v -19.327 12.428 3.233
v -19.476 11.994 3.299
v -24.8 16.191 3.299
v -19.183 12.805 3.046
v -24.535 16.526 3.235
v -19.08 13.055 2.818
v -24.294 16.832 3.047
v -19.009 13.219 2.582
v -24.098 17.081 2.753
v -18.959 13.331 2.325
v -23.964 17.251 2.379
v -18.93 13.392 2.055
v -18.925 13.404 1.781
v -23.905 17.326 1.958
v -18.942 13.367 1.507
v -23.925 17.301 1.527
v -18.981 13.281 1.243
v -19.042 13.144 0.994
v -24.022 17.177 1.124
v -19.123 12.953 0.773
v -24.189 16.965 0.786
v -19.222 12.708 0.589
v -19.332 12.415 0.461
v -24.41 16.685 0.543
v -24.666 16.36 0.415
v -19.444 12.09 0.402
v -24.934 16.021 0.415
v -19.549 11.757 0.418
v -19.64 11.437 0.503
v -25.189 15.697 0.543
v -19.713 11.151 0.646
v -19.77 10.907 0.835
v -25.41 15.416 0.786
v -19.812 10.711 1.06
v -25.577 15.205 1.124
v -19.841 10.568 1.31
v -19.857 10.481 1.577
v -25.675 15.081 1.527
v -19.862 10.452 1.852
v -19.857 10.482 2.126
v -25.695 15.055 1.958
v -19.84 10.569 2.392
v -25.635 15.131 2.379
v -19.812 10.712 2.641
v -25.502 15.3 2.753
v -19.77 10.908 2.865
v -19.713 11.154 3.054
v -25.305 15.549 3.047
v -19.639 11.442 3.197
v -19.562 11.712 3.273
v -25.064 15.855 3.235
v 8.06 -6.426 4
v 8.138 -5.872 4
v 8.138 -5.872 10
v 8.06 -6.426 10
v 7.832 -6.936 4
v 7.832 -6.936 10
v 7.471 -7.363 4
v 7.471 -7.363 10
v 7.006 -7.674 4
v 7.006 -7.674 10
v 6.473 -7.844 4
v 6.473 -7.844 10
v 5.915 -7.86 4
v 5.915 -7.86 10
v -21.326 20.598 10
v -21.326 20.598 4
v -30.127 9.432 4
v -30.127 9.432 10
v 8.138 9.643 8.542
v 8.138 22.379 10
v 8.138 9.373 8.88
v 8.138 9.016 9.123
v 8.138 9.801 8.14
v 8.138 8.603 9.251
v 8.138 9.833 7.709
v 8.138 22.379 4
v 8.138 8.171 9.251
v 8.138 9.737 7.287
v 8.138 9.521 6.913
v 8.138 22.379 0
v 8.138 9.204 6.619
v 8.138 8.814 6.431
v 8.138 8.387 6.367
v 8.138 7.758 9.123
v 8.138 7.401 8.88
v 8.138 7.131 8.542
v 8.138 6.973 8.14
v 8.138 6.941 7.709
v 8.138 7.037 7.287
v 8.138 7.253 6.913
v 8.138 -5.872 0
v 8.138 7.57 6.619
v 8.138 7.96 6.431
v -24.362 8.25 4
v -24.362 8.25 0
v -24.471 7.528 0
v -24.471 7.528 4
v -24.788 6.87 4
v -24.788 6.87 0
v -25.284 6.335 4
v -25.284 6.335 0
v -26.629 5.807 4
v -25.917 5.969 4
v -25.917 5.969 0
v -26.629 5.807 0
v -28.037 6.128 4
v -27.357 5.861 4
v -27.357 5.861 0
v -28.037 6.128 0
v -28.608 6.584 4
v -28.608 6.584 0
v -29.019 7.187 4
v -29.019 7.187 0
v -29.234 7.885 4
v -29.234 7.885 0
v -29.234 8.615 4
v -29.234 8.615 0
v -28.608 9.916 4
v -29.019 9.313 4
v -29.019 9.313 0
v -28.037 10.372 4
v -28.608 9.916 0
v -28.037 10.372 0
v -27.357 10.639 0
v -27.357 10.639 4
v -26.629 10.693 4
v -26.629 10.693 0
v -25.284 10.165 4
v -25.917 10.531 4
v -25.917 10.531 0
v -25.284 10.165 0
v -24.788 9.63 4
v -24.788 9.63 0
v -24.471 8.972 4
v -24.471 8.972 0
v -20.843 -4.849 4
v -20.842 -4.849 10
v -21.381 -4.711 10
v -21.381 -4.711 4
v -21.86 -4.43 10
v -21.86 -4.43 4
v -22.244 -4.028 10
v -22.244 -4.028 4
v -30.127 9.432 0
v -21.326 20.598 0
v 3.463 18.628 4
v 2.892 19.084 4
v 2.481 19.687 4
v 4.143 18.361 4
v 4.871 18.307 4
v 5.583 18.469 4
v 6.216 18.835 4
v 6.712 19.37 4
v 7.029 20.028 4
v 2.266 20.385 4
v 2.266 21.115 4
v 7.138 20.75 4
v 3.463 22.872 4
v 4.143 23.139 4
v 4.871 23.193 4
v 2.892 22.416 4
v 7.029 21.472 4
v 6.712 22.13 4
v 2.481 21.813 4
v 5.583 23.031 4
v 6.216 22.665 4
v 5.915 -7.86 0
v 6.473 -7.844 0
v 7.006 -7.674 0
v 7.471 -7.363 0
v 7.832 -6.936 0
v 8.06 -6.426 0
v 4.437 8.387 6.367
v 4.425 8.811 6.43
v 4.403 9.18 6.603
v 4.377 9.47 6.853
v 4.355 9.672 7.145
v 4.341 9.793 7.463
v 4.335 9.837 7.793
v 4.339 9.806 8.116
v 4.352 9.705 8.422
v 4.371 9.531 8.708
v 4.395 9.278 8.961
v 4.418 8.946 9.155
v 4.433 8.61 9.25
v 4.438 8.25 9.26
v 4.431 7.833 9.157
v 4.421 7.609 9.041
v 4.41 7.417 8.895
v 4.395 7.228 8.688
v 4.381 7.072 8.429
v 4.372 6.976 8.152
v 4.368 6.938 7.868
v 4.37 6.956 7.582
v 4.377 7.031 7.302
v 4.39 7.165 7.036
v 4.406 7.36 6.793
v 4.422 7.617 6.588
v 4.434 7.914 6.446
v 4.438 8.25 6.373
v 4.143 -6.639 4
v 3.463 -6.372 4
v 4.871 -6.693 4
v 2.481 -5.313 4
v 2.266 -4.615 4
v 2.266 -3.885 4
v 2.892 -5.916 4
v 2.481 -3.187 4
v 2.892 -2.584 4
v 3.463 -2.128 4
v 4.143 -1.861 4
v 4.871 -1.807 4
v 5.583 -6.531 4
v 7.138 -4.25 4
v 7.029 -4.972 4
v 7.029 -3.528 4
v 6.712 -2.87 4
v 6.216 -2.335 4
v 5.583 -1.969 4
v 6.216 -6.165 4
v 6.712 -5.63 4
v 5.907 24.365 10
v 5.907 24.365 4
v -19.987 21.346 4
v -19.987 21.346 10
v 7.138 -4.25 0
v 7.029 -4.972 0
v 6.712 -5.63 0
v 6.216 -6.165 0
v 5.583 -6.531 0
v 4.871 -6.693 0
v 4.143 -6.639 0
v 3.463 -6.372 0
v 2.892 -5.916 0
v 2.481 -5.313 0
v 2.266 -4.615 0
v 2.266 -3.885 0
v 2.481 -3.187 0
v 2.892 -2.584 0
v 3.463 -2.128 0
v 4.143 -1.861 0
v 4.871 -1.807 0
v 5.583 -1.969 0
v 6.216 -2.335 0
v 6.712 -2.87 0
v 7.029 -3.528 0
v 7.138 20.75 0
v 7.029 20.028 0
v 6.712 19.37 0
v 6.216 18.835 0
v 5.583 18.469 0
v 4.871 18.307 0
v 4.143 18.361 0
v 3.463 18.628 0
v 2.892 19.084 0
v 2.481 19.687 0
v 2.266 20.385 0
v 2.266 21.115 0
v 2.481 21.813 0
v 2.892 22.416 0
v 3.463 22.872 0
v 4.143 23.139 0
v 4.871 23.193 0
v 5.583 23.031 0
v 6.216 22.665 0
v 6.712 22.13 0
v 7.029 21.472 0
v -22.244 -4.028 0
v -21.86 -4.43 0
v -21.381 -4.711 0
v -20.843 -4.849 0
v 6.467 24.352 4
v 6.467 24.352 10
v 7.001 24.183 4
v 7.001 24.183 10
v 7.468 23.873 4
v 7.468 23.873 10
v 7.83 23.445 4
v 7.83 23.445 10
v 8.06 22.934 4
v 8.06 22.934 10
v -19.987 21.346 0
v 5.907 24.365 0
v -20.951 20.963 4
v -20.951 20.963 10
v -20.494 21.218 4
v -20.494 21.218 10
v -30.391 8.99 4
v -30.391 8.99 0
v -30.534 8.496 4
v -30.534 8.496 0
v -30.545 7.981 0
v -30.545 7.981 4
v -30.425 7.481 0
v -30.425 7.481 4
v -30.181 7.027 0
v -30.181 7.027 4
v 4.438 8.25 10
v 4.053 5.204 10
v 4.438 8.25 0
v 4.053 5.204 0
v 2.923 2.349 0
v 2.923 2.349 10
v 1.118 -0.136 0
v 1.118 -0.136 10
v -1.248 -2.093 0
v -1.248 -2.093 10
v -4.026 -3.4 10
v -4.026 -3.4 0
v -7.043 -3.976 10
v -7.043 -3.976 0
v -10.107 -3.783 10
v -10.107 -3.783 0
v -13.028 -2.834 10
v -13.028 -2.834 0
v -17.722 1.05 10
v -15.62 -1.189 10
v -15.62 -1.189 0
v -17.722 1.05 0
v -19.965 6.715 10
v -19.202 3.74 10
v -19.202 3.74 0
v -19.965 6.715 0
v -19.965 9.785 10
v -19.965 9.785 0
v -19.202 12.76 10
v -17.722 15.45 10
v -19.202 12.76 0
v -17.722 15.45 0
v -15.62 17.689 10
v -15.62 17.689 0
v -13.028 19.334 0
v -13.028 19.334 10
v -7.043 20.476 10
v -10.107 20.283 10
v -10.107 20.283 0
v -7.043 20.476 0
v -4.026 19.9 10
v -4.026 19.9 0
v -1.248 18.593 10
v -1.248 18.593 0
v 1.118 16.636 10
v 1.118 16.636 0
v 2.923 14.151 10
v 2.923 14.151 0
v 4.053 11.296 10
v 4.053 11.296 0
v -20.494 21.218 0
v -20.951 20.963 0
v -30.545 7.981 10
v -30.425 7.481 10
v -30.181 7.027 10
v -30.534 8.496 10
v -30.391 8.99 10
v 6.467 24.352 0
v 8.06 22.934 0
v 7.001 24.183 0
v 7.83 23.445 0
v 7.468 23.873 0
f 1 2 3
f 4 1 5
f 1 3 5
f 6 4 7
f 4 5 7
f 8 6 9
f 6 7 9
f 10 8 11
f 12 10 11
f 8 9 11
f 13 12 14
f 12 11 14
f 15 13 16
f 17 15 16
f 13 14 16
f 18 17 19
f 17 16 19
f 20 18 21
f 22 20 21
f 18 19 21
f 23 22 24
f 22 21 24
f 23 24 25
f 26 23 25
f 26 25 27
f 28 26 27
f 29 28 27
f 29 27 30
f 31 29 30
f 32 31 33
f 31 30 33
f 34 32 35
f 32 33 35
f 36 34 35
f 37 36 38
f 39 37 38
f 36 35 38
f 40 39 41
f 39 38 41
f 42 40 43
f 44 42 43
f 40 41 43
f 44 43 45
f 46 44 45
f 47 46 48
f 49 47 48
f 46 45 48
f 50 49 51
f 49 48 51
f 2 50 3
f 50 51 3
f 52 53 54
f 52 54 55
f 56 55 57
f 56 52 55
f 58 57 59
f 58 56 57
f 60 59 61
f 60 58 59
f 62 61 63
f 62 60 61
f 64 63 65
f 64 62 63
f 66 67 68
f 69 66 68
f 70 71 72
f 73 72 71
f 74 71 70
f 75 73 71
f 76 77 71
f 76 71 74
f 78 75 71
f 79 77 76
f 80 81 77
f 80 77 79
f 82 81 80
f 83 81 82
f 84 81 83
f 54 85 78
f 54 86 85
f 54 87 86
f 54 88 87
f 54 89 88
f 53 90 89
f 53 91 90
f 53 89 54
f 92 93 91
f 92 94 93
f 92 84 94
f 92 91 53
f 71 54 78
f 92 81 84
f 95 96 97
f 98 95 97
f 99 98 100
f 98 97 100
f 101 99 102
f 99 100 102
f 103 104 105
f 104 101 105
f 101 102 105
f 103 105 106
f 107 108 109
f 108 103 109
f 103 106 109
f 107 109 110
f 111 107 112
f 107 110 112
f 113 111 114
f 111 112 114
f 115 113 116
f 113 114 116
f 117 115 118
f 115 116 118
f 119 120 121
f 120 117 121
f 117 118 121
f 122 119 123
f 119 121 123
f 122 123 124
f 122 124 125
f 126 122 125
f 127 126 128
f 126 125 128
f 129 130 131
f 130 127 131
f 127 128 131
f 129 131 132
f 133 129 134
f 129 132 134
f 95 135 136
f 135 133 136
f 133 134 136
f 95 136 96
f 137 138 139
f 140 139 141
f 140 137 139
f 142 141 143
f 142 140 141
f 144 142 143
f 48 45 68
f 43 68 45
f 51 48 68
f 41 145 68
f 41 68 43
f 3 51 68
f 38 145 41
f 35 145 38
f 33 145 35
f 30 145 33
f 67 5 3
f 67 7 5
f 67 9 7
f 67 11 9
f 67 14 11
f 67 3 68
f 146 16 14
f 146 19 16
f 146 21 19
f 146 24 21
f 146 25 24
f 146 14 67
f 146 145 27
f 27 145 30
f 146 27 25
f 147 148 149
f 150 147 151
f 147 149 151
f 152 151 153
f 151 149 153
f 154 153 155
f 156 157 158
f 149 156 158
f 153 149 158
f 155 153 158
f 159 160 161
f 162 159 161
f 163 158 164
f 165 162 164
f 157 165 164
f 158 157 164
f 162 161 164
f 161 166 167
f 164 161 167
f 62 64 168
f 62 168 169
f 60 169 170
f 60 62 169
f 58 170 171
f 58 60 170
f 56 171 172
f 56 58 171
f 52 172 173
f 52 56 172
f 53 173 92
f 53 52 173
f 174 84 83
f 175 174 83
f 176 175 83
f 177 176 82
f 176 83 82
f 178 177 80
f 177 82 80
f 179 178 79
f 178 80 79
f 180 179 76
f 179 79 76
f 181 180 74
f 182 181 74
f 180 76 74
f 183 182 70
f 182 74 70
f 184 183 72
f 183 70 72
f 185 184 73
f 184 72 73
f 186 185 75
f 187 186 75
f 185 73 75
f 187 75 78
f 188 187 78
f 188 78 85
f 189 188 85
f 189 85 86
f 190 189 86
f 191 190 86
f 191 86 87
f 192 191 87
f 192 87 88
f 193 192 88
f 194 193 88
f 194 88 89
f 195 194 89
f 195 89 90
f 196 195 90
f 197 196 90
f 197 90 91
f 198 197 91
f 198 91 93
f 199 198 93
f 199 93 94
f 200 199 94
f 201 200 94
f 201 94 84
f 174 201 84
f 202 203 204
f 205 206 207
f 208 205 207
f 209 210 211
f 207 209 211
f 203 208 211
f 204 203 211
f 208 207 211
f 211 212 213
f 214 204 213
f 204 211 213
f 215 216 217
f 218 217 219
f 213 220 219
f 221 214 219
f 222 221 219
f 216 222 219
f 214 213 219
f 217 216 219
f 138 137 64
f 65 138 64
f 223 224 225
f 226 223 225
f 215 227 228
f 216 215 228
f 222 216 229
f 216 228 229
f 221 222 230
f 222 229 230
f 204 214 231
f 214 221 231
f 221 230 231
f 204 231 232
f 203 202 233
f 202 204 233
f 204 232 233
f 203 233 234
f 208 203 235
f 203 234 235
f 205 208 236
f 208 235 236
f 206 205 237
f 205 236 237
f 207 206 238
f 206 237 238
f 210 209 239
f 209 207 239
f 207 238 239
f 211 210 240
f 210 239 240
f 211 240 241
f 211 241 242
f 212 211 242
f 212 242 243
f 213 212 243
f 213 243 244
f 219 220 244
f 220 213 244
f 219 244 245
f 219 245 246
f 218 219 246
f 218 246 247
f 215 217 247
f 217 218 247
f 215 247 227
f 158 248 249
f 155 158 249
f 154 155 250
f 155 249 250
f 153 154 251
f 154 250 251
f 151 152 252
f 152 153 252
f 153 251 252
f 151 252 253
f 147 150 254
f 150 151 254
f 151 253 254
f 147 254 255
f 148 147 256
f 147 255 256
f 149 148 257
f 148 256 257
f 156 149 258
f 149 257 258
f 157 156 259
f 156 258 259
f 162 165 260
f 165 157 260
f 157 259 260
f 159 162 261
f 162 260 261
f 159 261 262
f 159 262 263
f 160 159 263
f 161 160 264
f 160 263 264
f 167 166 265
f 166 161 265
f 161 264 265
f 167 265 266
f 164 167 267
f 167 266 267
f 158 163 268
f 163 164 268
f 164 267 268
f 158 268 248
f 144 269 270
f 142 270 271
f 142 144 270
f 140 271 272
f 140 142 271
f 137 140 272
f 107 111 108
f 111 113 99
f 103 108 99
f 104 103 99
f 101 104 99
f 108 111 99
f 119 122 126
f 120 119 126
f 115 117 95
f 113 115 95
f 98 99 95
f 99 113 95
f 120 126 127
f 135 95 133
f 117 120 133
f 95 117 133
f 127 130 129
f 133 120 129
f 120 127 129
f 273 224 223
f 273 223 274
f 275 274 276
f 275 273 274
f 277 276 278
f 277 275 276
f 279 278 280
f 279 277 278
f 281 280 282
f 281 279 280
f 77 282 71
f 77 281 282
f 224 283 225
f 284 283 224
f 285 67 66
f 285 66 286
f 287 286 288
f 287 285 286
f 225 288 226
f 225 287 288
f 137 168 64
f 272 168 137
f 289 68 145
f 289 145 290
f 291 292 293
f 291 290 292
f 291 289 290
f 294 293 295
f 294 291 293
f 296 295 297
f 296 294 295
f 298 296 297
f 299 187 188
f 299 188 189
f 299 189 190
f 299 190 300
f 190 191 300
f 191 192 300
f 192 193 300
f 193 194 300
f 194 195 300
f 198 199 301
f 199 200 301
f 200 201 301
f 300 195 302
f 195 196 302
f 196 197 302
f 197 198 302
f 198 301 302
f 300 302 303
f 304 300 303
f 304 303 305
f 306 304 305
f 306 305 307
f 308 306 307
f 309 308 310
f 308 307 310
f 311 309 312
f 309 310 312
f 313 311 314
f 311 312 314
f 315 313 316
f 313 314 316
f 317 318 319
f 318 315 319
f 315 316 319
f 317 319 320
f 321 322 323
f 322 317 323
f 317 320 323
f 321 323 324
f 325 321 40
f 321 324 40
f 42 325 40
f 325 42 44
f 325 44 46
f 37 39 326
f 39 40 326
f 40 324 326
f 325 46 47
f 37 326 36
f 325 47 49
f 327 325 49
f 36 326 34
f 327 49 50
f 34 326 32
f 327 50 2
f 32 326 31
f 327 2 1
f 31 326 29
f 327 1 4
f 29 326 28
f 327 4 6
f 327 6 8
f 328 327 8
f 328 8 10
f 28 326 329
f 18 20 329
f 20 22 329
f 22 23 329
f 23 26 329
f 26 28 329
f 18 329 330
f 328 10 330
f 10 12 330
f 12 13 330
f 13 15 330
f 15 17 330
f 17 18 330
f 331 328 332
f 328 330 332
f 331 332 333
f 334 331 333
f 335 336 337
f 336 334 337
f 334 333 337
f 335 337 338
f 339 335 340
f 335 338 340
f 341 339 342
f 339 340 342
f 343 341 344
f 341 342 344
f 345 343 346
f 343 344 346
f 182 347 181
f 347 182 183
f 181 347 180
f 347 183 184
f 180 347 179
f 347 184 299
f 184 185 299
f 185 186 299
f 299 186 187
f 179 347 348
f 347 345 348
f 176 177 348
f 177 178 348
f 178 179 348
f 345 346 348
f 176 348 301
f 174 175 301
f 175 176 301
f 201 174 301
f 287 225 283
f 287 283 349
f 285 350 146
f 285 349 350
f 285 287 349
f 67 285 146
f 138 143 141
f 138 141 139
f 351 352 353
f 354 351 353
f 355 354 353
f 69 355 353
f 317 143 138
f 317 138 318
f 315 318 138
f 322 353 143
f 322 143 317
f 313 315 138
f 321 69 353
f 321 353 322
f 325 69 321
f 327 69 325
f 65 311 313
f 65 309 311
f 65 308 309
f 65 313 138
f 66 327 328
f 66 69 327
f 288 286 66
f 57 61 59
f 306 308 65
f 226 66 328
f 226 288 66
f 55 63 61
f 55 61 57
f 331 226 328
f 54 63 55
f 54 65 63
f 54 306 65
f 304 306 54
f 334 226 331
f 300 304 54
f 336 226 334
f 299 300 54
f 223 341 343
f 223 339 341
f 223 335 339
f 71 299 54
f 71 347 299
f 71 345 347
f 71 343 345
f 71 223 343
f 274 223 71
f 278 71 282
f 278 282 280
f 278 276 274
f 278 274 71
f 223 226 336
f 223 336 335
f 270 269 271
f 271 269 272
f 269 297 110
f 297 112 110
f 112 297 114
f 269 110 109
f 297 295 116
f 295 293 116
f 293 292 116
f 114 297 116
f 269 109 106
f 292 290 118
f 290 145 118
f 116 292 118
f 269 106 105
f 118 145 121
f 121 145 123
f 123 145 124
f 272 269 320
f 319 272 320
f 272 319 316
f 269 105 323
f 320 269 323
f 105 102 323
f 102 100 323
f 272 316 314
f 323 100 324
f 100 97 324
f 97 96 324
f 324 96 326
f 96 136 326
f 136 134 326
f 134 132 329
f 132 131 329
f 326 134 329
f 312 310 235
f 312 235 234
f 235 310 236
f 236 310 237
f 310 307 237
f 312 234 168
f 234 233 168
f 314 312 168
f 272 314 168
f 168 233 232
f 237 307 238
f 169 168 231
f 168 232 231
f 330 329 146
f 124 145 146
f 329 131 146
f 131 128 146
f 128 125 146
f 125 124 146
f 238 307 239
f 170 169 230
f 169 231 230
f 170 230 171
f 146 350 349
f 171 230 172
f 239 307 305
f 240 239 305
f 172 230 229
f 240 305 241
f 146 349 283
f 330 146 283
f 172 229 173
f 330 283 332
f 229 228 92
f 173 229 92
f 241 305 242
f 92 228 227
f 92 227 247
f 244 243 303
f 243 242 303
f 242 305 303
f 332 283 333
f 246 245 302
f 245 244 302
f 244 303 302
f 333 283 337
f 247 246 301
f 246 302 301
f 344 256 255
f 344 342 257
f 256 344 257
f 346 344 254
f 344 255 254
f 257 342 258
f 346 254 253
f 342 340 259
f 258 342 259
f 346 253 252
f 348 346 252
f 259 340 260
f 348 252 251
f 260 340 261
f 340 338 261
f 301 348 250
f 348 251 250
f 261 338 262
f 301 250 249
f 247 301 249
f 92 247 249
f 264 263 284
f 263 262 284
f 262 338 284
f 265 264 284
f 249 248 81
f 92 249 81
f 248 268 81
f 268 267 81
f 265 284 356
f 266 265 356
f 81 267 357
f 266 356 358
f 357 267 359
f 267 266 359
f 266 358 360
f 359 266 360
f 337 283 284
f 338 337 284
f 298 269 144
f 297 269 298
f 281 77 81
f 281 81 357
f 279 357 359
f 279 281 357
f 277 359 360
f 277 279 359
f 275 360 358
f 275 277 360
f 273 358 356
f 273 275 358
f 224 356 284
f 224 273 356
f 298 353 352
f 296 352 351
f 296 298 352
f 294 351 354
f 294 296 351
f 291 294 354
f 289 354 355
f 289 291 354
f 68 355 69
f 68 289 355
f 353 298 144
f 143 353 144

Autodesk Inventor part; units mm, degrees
ref_plane "YZ Plane" through (0, 0, 0) normal (1, 0, 0) x (0, 1, 0)
ref_plane "XZ Plane" through (0, 0, 0) normal (0, 1, 0) x (-1, 0, 0)
ref_plane "XY Plane" through (0, 0, 0) normal (0, 0, 1) x (1, 0, 0)
sketch "Sketch1" plane through (0, 0, 0) normal (0, 0, 1) x (1, 0, 0)
  arc A0 (-5.5118, -5.25) -> (-5.5118, 21.75) centre (-8.0118, 8.25) ccw construction
  circle A1 centre (-7.8118, 8.25) radius 10 construction
  circle A2 centre (-7.8118, 8.25) radius 12.15 construction
  line L0 (-5.5118, -8.25) -> (-5.5118, -5.25) construction
  line L1 (7.4882, -8.25) -> (-5.5118, -8.25) construction
  line L2 (11.0118, -4.7265) -> (7.4882, -8.25) construction
  line L3 (11.0118, -4.7265) -> (11.0118, 21.2265) construction
  line L4 (11.0118, 21.2265) -> (7.4882, 24.75) construction
  line L5 (7.4882, 24.75) -> (-5.5118, 24.75) construction
  line L6 (-5.5118, 24.75) -> (-5.5118, 21.75) construction
  arc A3 (-5.5118, -5.25) -> (-5.5118, 21.75) centre (-8.0118, 8.25) ccw construction
  line L7 (5.7178, 24.75) -> (38.7178, 24.75) construction
  circle A4 centre (-26.8118, 8.25) radius 1.45 projected
  circle A5 centre (4.6882, -4.25) radius 1.45 projected
  arc A6 (-22.4732, 11.4188) -> (-22.4732, 5.0812) centre (-7.8118, 8.25) ccw projected
  line L8 (-22.4732, 5.0812) -> (-3.2253, -6.0316) construction
  arc A7 (-3.2253, -6.0316) -> (2.2632, -2.8628) centre (-7.8118, 8.25) ccw projected
  line L9 (2.2632, 19.3628) -> (2.2632, -2.8628) construction
  arc A8 (2.2632, 19.3628) -> (-3.2253, 22.5316) centre (-7.8118, 8.25) ccw projected
  line L10 (-22.4732, 11.4188) -> (-3.2253, 22.5316) construction
  line L11 (-32.9624, -8.8) -> (-32.9624, 25.3) projected
  line L12 (-32.9624, 25.3) -> (-29.2731, 25.3) projected
  line L13 (-29.2731, 25.3) -> (-24.8618, 29.7113) projected
  line L14 (-24.8618, 29.7113) -> (-24.8618, 33.4006) projected
  line L15 (-24.8618, 33.4006) -> (9.2382, 33.4006) projected
  line L16 (9.2382, 33.4006) -> (9.2382, 29.7113) projected
  line L17 (9.2382, 29.7113) -> (13.6496, 25.3) projected
  line L18 (13.6496, 25.3) -> (17.3389, 25.3) projected
  line L19 (17.3389, 25.3) -> (17.3389, -8.8) projected
  line L20 (17.3389, -8.8) -> (13.6496, -8.8) projected
  line L21 (13.6496, -8.8) -> (9.2382, -13.2113) projected
  line L22 (9.2382, -13.2113) -> (9.2382, -16.9006) projected
  line L23 (9.2382, -16.9006) -> (-24.8618, -16.9006) projected
  line L24 (-24.8618, -16.9006) -> (-24.8618, -13.2113) projected
  line L25 (-24.8618, -13.2113) -> (-29.2731, -8.8) projected
  line L26 (-29.2731, -8.8) -> (-32.9624, -8.8) projected
  circle A9 centre (4.6882, 20.75) radius 1.45 projected
  line L27 (-21.7254, -4.75) -> (-31.0589, 8.25)
  line L28 (-31.0589, 8.25) -> (-20.8118, 21.25)
  circle A10 centre (-7.8118, 8.25) radius 12.5 construction
  circle A11 centre (4.6882, -4.25) radius 2.45
  circle A12 centre (4.6882, 20.75) radius 2.45
  circle A13 centre (-26.8118, 8.25) radius 2.45
  circle A14 centre (-7.8118, 8.25) radius 10 projected
  circle A15 centre (-7.8118, 8.25) radius 10 projected
  circle A16 centre (-7.8118, 8.25) radius 10 projected
  circle A17 centre (-7.8118, 8.25) radius 12.25
  line L29 (-20.8118, 21.25) -> (8.1382, 24.6257)
  line L30 (8.1382, 24.6257) -> (8.1382, -8.1099)
  line L31 (8.1382, -8.1099) -> (-21.7254, -4.75)
  circle A18 centre (4.6882, -4.25) radius 3.45 construction
  circle A19 centre (4.6882, 20.75) radius 3.45 construction
  circle A20 centre (-26.8118, 8.25) radius 3.45 construction
  dimension "d12" = 13
  dimension "d14" = 13
  dimension "d15" = 13
  dimension "d16" = 0
  dimension "d17" = 4.9
  dimension "d18" = 4.9
  dimension "d19" = 4.9
  dimension "d25" = 24.5
  dimension "d32" = 1
  dimension "d33" = 1
  dimension "d35" = 1
extrude "Extrusion1" add sketch "Sketch1" along normal blind 4 contours L27 L28 L29 L30 L31
sketch "Sketch3" plane through (0, 0, 0) normal (0, 0, -1) x (-1, 0, 0)
  circle A0 centre (-4.6882, 20.75) radius 1.45 projected
  circle A1 centre (26.8118, 8.25) radius 1.45 projected
  circle A2 centre (-4.6882, -4.25) radius 1.45 projected
  circle A3 centre (7.8118, 8.25) radius 14 projected
  line L0 (1.437, 26.1707) -> (-0.0466, 24.25) projected
  line L1 (1.437, 25.85) -> (1.437, 26.1707) projected
  line L2 (7.7704, 25.85) -> (1.437, 25.85) projected
  line L3 (7.7704, 32.85) -> (7.7704, 25.85) projected
  line L4 (15.1593, 24.25) -> (7.7704, 32.85) projected
  line L5 (15.1593, 24.25) -> (23.8118, 24.25) projected
  line L6 (23.8118, 24.25) -> (30.5959, 9.0658) projected
  arc A4 (30.5959, 7.4342) -> (30.5959, 9.0658) centre (28.7698, 8.25) ccw projected
  line L7 (30.5959, 7.4342) -> (23.8118, -7.75) projected
  line L8 (23.8118, -7.75) -> (15.1593, -7.75) projected
  line L9 (15.1593, -7.75) -> (7.7704, -16.35) projected
  line L10 (7.7704, -9.35) -> (7.7704, -16.35) projected
  line L11 (1.437, -9.35) -> (7.7704, -9.35) projected
  line L12 (1.437, -9.6707) -> (1.437, -9.35) projected
  line L13 (1.437, -9.6707) -> (-0.0466, -7.75) projected
  line L14 (-0.0466, -7.75) -> (-8.1882, -7.75) projected
  line L15 (-8.1882, -7.75) -> (-10.9318, -5.0065) projected
  line L16 (-10.9318, -5.0065) -> (-10.9318, 21.5065) projected
  line L17 (-10.9318, 21.5065) -> (-8.1882, 24.25) projected
  line L18 (-8.1882, 24.25) -> (-0.0466, 24.25) projected
  point P0 (0, 0)
fillet "Fillet1" radius 2 5 edges at (-31.0589, 8.25, 2) (-20.8118, 21.25, 2) (-21.7254, -4.75, 2) (8.1382, 24.6257, 2) (8.1382, -8.1099, 2)
sketch "Sketch5" plane through (-21.3259, 20.5977, 0) normal (-0.7853545, 0.6190463, 0) x (0, 0, 1)
  circle A0 centre (1.8492, -5.6115) radius 1.45
  point P0 (0, -2.9748)
  dimension "d21" = 2.9
extrude "Extrusion3" cut sketch "Sketch5" against normal blind 10
sketch "Sketch6" plane through (0, 0, 4) normal (0, 0, 1) x (1, 0, 0)
  arc A0 (-19.9868, 21.3462) -> (-21.3259, 20.5977) centre (-19.7552, 19.3596) ccw projected
  line L0 (-21.3259, 20.5977) -> (-30.1272, 9.432) projected
  arc A1 (-30.1272, 9.432) -> (-30.1811, 7.0274) centre (-28.5565, 8.1939) ccw projected
  line L1 (-30.1811, 7.0274) -> (-22.2435, -4.0283) projected
  arc A2 (-22.2435, -4.0283) -> (-20.8425, -4.8493) centre (-20.6189, -2.8619) ccw projected
  circle A3 centre (-26.8118, 8.25) radius 2.45 projected
  circle A4 centre (4.6882, 20.75) radius 2.45 projected
  circle A5 centre (4.6882, -4.25) radius 2.45 projected
  circle A6 centre (-7.8118, 8.25) radius 12.25 projected
  line L2 (-20.8425, -4.8493) -> (5.9146, -7.8597) projected
  line L3 (8.1382, -5.8723) -> (8.1382, 22.3789) projected
  line L4 (5.9066, 24.3654) -> (-19.9868, 21.3462) projected
  arc A7 (5.9146, -7.8597) -> (8.1382, -5.8723) centre (6.1382, -5.8723) ccw projected
  arc A8 (8.1382, 22.3789) -> (5.9066, 24.3654) centre (6.1382, 22.3789) ccw projected
  point P0 (0, 0)
extrude "Extrusion4" add sketch "Sketch6" along normal blind 6 contours L4 A8 L3 A7 L2 A2 L1 A1 L0 A0 | A3 | A4 | A5
sketch "Sketch7" plane through (8.1382, -5.9842, 0) normal (1, 0, 0) x (0, 0, -1)
  spline S0 degree 3 poles (-20.3248, 15.4894) (-20.4822, 15.4894) (-20.6498, 15.4578) (-20.9577, 15.3301) (-21.098, 15.234) (-21.3195, 15.0125) (-21.4156, 14.8722) (-21.5433, 14.5643) (-21.5748, 14.3967) (-21.5748, 14.082) (-21.5433, 13.9144) (-21.4156, 13.6065) (-21.3195, 13.4662) (-21.098, 13.2447) (-20.9577, 13.1486) (-20.6498, 13.0209) (-20.4822, 12.9894) (-20.1675, 12.9894) (-19.9999, 13.0209) (-19.692, 13.1486) (-19.5517, 13.2447) (-19.3302, 13.4662) (-19.2341, 13.6065) (-19.1064, 13.9144) (-19.0748, 14.082) (-19.0748, 14.3967) (-19.1064, 14.5643) (-19.2341, 14.8722) (-19.3302, 15.0125) (-19.5517, 15.234) (-19.692, 15.3301) (-19.9999, 15.4578) (-20.1675, 15.4894) (-20.3248, 15.4894) knots 0 0 0 0 0.047214 0.047214 0.094427 0.094427 0.141639 0.141639 0.18885 0.18885 0.236062 0.236062 0.283273 0.283273 0.330487 0.330487 0.3777 0.3777 0.424914 0.424914 0.472128 0.472128 0.519339 0.519339 0.56655 0.56655 0.613762 0.613762 0.660973 0.660973 0.708187 0.708187 0.755401 0.755401 0.755401 0.755401 projected
  circle A0 centre (-14.6316, 14.3711) radius 1.45
  circle A1 centre (-7.8169, 14.3711) radius 1.45
  point P0 (0, 5.9842)
  point P1 (-20.3248, 15.4894)
  dimension "d28" = 2.9
  dimension "d29" = 2.9
extrude "Extrusion5" cut sketch "Sketch7" against normal blind 16 contours A0 | A1
properties part number "cellSTORM_inverted_objectiveadapter"
